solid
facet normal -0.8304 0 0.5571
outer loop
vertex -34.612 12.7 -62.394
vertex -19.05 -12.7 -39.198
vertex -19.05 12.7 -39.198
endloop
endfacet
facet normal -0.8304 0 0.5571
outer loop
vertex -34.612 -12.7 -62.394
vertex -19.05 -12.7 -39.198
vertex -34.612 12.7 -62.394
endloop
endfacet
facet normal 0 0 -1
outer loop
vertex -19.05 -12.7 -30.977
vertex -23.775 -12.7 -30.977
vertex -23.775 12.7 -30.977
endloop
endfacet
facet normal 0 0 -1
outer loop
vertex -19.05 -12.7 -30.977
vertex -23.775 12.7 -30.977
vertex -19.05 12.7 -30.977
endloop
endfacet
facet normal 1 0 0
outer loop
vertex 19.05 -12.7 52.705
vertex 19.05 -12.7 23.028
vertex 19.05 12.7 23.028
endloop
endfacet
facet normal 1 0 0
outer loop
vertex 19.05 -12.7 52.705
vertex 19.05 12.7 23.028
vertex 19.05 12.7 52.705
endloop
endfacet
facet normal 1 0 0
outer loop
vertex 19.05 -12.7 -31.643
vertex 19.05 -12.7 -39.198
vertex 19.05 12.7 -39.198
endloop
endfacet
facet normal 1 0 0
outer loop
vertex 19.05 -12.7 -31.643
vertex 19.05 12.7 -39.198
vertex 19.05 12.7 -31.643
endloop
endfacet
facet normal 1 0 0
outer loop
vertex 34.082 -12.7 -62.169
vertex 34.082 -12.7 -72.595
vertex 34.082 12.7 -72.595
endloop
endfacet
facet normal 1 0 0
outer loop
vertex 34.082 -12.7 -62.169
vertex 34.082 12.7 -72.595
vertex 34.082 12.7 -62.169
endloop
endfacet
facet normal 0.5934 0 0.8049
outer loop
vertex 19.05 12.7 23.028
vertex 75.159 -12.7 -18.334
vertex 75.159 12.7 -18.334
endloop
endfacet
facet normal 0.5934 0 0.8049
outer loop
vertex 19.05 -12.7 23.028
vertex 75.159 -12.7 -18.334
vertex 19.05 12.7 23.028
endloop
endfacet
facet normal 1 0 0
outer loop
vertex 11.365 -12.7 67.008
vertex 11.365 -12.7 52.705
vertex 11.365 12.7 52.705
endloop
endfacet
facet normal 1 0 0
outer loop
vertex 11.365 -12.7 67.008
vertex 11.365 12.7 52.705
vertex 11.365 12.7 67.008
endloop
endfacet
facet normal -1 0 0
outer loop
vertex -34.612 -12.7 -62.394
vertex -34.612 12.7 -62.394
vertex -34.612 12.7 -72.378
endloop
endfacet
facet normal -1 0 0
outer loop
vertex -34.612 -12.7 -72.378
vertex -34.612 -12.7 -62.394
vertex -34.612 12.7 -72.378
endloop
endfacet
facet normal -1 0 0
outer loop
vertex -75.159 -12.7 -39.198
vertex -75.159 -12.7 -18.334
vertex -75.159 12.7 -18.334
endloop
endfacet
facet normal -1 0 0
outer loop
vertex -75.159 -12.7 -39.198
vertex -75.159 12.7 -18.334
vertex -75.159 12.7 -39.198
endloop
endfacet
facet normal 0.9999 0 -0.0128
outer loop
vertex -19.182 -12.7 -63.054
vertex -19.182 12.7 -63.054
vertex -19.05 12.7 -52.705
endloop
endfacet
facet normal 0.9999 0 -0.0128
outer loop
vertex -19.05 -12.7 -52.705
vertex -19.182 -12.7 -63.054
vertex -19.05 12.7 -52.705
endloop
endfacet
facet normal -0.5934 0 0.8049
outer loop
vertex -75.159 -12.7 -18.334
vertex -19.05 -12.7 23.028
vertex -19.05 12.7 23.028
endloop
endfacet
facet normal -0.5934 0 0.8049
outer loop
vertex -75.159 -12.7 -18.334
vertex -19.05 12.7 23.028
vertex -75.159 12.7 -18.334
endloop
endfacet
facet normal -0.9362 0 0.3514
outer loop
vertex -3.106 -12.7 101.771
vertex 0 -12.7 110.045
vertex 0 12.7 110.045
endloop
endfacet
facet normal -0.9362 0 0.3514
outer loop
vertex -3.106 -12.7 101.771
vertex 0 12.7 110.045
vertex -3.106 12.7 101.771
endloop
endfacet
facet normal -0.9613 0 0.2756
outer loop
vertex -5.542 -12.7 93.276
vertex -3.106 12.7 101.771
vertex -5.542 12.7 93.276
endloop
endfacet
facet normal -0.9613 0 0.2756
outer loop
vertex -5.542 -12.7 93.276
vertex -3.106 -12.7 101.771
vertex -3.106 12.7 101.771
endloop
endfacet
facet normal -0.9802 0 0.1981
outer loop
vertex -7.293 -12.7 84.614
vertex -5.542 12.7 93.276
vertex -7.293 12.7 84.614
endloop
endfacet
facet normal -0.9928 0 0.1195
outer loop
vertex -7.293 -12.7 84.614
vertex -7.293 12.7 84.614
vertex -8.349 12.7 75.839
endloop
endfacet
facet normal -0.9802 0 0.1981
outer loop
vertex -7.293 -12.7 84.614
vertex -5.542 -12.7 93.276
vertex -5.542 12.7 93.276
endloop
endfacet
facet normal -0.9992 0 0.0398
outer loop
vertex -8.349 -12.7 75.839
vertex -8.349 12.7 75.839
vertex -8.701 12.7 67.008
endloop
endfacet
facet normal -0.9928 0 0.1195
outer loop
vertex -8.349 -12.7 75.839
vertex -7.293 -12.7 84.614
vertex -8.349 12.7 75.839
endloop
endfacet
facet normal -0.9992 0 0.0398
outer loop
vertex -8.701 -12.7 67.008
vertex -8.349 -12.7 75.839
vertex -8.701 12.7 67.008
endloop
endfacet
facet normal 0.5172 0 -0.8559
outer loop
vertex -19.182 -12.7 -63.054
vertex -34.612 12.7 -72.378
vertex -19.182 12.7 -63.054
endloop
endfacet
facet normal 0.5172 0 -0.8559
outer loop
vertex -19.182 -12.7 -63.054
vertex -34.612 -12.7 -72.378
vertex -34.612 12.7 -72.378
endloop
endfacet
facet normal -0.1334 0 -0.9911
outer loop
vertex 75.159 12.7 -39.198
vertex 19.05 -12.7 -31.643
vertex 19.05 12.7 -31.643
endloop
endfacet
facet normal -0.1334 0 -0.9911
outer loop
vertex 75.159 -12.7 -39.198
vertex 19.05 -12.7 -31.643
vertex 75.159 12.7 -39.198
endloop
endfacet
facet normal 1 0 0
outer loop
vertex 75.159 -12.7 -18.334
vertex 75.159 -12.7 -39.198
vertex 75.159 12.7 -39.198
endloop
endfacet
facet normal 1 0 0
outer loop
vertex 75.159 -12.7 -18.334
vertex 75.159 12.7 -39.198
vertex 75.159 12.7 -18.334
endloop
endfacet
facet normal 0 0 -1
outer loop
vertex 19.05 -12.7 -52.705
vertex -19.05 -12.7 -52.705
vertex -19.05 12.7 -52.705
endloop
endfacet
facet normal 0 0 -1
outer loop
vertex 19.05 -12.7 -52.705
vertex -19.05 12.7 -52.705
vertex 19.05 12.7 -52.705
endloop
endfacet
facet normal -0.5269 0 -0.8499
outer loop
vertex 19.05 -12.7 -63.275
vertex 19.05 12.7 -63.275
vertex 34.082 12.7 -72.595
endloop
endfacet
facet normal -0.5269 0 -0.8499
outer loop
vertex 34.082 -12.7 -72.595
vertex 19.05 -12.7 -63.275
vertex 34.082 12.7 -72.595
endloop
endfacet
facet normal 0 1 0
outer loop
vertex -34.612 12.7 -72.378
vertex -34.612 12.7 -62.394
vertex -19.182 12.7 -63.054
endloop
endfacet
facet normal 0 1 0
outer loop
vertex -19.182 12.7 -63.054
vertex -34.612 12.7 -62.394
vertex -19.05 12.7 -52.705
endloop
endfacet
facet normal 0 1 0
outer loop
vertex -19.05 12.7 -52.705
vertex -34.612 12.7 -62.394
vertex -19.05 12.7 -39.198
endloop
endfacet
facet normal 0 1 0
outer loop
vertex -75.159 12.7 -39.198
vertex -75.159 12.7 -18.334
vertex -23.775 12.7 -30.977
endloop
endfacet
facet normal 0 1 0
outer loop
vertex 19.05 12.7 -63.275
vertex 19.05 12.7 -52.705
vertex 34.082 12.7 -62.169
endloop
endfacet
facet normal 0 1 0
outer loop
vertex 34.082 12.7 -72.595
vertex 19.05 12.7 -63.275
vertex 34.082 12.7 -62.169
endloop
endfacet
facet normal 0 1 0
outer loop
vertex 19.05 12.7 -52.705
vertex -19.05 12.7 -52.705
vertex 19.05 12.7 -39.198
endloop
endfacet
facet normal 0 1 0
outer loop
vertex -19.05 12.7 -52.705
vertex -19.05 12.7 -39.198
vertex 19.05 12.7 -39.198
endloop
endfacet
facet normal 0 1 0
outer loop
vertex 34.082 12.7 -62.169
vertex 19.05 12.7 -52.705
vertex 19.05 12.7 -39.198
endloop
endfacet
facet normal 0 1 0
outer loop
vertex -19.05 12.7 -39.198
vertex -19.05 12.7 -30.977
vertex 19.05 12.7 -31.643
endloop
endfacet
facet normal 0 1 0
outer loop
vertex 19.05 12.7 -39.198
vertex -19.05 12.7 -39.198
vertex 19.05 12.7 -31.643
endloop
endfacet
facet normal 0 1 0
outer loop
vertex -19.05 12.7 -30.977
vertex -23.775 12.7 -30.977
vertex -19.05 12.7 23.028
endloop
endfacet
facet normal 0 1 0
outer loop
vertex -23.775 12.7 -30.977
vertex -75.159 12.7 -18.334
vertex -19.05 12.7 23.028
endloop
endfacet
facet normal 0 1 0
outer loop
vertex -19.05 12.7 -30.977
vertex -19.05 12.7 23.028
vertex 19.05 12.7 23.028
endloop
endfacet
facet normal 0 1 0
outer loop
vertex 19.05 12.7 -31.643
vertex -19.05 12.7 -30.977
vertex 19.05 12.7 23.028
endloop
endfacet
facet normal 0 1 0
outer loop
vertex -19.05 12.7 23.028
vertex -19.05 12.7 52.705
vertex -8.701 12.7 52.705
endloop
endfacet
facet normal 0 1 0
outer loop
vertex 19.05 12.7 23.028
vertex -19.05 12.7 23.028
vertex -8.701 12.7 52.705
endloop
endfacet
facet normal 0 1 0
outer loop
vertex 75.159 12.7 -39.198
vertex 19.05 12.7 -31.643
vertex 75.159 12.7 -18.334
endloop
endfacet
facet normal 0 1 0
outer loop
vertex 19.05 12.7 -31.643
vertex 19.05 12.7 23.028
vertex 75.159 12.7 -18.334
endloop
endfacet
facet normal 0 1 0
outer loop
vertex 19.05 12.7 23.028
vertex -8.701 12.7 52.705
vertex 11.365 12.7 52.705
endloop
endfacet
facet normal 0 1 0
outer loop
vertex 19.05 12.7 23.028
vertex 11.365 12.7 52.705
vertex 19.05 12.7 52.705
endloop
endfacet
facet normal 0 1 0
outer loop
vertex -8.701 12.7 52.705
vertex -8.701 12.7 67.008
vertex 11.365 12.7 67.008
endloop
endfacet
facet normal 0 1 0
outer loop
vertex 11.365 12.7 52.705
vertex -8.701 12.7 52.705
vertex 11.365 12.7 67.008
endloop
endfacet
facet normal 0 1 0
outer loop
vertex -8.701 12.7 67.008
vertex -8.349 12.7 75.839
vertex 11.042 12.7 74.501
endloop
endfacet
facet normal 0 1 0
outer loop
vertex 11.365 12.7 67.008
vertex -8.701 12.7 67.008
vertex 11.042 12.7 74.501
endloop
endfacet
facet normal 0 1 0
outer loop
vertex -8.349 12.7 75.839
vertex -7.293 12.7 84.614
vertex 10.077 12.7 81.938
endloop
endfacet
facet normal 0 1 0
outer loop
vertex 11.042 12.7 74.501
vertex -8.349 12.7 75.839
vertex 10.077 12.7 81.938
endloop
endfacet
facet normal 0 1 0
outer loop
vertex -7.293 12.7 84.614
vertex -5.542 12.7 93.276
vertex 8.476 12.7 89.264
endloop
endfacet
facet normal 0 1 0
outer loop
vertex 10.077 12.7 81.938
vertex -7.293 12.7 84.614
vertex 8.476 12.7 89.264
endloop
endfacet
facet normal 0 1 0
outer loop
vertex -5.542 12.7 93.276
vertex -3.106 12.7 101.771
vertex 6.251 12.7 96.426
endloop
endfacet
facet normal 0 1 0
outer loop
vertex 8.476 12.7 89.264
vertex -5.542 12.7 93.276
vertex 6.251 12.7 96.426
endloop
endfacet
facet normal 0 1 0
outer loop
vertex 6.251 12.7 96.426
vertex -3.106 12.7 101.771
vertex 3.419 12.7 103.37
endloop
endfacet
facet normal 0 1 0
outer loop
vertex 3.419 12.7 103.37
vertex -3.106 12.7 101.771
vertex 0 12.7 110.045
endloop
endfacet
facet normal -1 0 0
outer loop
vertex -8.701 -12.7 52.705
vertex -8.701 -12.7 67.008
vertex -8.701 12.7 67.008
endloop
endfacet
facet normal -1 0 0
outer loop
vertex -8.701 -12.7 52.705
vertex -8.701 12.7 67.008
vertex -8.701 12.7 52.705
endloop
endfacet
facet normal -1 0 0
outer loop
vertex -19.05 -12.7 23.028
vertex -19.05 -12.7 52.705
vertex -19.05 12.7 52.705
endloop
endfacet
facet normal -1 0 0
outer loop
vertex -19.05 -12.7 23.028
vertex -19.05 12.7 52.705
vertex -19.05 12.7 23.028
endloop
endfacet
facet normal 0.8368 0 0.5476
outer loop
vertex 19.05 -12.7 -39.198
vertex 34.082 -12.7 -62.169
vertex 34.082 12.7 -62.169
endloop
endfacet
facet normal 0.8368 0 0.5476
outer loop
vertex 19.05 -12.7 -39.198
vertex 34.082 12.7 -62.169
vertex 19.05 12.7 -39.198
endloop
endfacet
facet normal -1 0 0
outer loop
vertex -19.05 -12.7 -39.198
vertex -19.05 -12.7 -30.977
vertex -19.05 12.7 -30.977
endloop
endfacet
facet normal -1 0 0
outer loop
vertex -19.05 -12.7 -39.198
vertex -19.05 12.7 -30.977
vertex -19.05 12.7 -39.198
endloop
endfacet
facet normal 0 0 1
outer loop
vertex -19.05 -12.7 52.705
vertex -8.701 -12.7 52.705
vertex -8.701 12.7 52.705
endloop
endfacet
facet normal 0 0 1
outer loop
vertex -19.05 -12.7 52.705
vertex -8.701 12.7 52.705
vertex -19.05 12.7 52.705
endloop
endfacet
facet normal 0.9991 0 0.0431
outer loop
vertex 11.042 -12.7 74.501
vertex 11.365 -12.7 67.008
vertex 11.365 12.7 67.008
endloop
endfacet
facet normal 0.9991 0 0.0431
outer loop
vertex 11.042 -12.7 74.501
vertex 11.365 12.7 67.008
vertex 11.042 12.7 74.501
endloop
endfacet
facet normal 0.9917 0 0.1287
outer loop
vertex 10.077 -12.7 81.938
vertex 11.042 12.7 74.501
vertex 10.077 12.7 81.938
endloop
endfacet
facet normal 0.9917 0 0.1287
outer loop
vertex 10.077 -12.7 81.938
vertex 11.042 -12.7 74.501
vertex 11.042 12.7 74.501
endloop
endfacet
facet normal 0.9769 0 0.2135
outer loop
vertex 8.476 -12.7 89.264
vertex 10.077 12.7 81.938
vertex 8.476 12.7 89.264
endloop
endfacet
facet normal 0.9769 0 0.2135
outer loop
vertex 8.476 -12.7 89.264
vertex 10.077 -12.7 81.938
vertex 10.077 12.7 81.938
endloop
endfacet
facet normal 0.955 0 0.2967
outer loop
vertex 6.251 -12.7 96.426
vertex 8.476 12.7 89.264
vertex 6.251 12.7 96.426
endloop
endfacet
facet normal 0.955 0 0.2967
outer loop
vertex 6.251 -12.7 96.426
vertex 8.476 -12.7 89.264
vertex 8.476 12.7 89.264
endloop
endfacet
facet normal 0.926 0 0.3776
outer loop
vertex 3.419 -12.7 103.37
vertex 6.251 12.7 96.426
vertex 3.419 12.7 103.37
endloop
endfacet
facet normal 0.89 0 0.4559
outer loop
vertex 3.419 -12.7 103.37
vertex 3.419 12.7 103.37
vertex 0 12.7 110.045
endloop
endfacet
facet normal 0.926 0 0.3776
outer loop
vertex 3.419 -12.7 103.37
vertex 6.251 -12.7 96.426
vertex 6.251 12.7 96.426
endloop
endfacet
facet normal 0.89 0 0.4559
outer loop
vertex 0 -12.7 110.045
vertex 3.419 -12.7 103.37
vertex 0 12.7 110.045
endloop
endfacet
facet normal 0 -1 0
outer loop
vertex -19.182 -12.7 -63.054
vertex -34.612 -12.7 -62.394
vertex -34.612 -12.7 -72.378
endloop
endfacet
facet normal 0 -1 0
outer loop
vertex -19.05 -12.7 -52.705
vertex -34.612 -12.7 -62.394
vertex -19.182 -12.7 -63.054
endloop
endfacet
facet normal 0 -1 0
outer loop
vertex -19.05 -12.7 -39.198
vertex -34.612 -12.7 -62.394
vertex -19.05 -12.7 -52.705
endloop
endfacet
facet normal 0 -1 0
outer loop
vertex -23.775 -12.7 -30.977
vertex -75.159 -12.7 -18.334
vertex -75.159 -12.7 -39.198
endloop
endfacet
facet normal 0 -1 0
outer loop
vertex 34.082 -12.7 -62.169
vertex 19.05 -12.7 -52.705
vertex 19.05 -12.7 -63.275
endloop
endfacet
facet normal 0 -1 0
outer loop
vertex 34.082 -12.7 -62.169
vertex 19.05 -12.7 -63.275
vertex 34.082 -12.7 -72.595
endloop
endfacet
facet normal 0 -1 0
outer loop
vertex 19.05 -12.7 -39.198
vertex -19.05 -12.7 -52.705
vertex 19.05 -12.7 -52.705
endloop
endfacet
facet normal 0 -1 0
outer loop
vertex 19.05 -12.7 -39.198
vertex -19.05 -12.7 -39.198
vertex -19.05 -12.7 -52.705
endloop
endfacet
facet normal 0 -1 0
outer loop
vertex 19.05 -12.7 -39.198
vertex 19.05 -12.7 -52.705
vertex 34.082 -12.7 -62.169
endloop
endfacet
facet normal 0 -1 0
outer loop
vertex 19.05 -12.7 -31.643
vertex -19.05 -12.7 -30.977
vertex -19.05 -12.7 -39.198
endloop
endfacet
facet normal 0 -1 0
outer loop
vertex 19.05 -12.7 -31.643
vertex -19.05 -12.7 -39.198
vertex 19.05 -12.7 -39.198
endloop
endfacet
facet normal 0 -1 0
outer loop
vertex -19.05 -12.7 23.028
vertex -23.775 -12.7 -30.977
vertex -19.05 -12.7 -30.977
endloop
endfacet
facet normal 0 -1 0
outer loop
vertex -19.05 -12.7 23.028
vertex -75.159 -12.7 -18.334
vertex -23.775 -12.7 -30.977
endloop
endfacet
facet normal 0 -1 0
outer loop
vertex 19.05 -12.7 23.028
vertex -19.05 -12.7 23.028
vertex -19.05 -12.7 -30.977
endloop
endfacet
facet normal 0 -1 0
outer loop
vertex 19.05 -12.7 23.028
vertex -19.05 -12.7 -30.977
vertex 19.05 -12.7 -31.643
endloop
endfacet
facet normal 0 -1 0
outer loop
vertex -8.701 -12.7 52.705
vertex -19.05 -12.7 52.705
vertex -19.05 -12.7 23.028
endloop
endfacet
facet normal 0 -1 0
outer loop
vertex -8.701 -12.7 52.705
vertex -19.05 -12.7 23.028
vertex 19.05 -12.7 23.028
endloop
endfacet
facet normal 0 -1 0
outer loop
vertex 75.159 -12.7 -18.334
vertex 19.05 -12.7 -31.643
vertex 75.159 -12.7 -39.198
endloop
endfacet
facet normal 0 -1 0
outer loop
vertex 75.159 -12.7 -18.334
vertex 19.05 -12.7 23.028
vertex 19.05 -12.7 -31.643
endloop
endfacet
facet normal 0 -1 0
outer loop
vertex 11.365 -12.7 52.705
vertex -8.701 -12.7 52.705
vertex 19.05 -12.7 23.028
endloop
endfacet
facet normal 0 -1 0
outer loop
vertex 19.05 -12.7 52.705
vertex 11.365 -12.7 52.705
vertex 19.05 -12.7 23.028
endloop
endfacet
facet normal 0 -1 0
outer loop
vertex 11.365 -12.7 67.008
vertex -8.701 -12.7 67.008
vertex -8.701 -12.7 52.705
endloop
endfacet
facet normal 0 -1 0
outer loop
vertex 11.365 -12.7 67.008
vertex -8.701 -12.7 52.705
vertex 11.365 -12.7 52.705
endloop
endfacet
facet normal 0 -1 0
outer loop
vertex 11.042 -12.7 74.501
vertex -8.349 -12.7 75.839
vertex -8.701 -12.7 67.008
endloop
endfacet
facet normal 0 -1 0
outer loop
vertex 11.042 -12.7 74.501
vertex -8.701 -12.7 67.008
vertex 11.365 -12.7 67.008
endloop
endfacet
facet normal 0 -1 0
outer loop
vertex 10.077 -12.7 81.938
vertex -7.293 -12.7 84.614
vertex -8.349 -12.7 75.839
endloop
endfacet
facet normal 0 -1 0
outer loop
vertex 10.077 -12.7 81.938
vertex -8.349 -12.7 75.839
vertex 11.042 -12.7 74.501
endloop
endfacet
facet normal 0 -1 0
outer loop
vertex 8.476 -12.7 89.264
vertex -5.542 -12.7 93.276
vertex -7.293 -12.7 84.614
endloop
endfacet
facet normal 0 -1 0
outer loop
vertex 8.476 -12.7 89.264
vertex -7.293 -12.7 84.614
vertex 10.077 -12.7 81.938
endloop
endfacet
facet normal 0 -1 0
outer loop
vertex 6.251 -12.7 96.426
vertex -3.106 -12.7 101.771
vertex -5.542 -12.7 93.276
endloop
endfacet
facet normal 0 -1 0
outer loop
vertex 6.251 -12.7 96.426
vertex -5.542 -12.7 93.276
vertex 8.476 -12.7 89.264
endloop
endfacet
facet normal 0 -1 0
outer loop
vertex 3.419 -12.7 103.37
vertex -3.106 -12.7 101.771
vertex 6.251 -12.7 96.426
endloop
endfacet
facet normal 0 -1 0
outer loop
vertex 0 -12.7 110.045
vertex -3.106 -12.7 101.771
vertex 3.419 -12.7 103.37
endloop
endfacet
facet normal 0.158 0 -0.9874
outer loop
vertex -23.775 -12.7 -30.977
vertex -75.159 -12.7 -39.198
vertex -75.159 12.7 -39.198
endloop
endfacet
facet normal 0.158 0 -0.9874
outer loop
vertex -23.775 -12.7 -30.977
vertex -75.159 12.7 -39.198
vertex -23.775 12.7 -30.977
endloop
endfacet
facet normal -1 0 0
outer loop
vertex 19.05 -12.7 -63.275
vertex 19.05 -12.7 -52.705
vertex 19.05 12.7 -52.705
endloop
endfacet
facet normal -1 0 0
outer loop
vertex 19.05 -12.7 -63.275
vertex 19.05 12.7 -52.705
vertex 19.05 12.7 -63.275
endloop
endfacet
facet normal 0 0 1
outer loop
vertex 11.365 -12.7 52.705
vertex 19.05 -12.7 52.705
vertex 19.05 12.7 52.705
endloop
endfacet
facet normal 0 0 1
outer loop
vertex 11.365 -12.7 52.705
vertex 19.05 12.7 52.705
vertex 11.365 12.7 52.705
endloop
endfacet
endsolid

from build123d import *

# Parameters (mm, degrees)
F1_DEPTH = 12.7


with BuildPart() as f1:
    # F0 (on Front) → F1 (new body, symmetric)
    with BuildSketch(Plane.XZ):
        with BuildLine():
            Line((-19.05, -52.705), (19.05, -52.705))
            Line((19.05, -52.705), (19.05, -63.275363))
            Line((19.05, -63.275363), (34.081931, -72.595161))
            Line((34.081931, -72.595161), (34.081931, -62.168677))
            Line((34.081931, -62.168677), (19.05, -39.198428))
            Line((19.05, -39.198428), (19.05, -31.643265))
            Line((19.05, -31.643265), (75.1586, -39.198428))
            Line((75.1586, -39.198428), (75.1586, -18.334107))
            Line((75.1586, -18.334107), (19.05, 23.027632))
            Line((19.05, 23.027632), (19.05, 52.705))
            Line((19.05, 52.705), (11.364806, 52.705))
            Line((11.364806, 52.705), (11.364806, 67.008361))
            ThreePointArc((11.364806, 67.008361), (8.475728, 89.264488), (0, 110.045344))
            ThreePointArc((0, 110.045344), (-6.504109, 88.962248), (-8.701194, 67.008361))
            Line((-8.701194, 67.008361), (-8.701194, 52.705))
            Line((-8.701194, 52.705), (-19.05, 52.705))
            Line((-19.05, 52.705), (-19.05, 23.027632))
            Line((-19.05, 23.027632), (-75.1586, -18.334107))
            Line((-75.1586, -18.334107), (-75.1586, -39.198428))
            Line((-75.1586, -39.198428), (-23.7749, -30.977035))
            Line((-23.7749, -30.977035), (-19.05, -30.977035))
            Line((-19.05, -30.977035), (-19.05, -39.198428))
            Line((-19.05, -39.198428), (-34.611922, -62.3945))
            Line((-34.611922, -62.3945), (-34.611922, -72.377621))
            Line((-34.611922, -72.377621), (-19.181741, -63.053779))
            Line((-19.181741, -63.053779), (-19.05, -52.705))
        make_face()
        Polygon((19.05, -30.977035), (19.05, -31.643265), (14.102228, -30.977035), align=None, mode=Mode.SUBTRACT)
        Polygon((14.102228, -30.977035), (19.05, -31.643265), (19.05, -30.977035), align=None)
    extrude(amount=F1_DEPTH, both=True)


solid = f1.part
